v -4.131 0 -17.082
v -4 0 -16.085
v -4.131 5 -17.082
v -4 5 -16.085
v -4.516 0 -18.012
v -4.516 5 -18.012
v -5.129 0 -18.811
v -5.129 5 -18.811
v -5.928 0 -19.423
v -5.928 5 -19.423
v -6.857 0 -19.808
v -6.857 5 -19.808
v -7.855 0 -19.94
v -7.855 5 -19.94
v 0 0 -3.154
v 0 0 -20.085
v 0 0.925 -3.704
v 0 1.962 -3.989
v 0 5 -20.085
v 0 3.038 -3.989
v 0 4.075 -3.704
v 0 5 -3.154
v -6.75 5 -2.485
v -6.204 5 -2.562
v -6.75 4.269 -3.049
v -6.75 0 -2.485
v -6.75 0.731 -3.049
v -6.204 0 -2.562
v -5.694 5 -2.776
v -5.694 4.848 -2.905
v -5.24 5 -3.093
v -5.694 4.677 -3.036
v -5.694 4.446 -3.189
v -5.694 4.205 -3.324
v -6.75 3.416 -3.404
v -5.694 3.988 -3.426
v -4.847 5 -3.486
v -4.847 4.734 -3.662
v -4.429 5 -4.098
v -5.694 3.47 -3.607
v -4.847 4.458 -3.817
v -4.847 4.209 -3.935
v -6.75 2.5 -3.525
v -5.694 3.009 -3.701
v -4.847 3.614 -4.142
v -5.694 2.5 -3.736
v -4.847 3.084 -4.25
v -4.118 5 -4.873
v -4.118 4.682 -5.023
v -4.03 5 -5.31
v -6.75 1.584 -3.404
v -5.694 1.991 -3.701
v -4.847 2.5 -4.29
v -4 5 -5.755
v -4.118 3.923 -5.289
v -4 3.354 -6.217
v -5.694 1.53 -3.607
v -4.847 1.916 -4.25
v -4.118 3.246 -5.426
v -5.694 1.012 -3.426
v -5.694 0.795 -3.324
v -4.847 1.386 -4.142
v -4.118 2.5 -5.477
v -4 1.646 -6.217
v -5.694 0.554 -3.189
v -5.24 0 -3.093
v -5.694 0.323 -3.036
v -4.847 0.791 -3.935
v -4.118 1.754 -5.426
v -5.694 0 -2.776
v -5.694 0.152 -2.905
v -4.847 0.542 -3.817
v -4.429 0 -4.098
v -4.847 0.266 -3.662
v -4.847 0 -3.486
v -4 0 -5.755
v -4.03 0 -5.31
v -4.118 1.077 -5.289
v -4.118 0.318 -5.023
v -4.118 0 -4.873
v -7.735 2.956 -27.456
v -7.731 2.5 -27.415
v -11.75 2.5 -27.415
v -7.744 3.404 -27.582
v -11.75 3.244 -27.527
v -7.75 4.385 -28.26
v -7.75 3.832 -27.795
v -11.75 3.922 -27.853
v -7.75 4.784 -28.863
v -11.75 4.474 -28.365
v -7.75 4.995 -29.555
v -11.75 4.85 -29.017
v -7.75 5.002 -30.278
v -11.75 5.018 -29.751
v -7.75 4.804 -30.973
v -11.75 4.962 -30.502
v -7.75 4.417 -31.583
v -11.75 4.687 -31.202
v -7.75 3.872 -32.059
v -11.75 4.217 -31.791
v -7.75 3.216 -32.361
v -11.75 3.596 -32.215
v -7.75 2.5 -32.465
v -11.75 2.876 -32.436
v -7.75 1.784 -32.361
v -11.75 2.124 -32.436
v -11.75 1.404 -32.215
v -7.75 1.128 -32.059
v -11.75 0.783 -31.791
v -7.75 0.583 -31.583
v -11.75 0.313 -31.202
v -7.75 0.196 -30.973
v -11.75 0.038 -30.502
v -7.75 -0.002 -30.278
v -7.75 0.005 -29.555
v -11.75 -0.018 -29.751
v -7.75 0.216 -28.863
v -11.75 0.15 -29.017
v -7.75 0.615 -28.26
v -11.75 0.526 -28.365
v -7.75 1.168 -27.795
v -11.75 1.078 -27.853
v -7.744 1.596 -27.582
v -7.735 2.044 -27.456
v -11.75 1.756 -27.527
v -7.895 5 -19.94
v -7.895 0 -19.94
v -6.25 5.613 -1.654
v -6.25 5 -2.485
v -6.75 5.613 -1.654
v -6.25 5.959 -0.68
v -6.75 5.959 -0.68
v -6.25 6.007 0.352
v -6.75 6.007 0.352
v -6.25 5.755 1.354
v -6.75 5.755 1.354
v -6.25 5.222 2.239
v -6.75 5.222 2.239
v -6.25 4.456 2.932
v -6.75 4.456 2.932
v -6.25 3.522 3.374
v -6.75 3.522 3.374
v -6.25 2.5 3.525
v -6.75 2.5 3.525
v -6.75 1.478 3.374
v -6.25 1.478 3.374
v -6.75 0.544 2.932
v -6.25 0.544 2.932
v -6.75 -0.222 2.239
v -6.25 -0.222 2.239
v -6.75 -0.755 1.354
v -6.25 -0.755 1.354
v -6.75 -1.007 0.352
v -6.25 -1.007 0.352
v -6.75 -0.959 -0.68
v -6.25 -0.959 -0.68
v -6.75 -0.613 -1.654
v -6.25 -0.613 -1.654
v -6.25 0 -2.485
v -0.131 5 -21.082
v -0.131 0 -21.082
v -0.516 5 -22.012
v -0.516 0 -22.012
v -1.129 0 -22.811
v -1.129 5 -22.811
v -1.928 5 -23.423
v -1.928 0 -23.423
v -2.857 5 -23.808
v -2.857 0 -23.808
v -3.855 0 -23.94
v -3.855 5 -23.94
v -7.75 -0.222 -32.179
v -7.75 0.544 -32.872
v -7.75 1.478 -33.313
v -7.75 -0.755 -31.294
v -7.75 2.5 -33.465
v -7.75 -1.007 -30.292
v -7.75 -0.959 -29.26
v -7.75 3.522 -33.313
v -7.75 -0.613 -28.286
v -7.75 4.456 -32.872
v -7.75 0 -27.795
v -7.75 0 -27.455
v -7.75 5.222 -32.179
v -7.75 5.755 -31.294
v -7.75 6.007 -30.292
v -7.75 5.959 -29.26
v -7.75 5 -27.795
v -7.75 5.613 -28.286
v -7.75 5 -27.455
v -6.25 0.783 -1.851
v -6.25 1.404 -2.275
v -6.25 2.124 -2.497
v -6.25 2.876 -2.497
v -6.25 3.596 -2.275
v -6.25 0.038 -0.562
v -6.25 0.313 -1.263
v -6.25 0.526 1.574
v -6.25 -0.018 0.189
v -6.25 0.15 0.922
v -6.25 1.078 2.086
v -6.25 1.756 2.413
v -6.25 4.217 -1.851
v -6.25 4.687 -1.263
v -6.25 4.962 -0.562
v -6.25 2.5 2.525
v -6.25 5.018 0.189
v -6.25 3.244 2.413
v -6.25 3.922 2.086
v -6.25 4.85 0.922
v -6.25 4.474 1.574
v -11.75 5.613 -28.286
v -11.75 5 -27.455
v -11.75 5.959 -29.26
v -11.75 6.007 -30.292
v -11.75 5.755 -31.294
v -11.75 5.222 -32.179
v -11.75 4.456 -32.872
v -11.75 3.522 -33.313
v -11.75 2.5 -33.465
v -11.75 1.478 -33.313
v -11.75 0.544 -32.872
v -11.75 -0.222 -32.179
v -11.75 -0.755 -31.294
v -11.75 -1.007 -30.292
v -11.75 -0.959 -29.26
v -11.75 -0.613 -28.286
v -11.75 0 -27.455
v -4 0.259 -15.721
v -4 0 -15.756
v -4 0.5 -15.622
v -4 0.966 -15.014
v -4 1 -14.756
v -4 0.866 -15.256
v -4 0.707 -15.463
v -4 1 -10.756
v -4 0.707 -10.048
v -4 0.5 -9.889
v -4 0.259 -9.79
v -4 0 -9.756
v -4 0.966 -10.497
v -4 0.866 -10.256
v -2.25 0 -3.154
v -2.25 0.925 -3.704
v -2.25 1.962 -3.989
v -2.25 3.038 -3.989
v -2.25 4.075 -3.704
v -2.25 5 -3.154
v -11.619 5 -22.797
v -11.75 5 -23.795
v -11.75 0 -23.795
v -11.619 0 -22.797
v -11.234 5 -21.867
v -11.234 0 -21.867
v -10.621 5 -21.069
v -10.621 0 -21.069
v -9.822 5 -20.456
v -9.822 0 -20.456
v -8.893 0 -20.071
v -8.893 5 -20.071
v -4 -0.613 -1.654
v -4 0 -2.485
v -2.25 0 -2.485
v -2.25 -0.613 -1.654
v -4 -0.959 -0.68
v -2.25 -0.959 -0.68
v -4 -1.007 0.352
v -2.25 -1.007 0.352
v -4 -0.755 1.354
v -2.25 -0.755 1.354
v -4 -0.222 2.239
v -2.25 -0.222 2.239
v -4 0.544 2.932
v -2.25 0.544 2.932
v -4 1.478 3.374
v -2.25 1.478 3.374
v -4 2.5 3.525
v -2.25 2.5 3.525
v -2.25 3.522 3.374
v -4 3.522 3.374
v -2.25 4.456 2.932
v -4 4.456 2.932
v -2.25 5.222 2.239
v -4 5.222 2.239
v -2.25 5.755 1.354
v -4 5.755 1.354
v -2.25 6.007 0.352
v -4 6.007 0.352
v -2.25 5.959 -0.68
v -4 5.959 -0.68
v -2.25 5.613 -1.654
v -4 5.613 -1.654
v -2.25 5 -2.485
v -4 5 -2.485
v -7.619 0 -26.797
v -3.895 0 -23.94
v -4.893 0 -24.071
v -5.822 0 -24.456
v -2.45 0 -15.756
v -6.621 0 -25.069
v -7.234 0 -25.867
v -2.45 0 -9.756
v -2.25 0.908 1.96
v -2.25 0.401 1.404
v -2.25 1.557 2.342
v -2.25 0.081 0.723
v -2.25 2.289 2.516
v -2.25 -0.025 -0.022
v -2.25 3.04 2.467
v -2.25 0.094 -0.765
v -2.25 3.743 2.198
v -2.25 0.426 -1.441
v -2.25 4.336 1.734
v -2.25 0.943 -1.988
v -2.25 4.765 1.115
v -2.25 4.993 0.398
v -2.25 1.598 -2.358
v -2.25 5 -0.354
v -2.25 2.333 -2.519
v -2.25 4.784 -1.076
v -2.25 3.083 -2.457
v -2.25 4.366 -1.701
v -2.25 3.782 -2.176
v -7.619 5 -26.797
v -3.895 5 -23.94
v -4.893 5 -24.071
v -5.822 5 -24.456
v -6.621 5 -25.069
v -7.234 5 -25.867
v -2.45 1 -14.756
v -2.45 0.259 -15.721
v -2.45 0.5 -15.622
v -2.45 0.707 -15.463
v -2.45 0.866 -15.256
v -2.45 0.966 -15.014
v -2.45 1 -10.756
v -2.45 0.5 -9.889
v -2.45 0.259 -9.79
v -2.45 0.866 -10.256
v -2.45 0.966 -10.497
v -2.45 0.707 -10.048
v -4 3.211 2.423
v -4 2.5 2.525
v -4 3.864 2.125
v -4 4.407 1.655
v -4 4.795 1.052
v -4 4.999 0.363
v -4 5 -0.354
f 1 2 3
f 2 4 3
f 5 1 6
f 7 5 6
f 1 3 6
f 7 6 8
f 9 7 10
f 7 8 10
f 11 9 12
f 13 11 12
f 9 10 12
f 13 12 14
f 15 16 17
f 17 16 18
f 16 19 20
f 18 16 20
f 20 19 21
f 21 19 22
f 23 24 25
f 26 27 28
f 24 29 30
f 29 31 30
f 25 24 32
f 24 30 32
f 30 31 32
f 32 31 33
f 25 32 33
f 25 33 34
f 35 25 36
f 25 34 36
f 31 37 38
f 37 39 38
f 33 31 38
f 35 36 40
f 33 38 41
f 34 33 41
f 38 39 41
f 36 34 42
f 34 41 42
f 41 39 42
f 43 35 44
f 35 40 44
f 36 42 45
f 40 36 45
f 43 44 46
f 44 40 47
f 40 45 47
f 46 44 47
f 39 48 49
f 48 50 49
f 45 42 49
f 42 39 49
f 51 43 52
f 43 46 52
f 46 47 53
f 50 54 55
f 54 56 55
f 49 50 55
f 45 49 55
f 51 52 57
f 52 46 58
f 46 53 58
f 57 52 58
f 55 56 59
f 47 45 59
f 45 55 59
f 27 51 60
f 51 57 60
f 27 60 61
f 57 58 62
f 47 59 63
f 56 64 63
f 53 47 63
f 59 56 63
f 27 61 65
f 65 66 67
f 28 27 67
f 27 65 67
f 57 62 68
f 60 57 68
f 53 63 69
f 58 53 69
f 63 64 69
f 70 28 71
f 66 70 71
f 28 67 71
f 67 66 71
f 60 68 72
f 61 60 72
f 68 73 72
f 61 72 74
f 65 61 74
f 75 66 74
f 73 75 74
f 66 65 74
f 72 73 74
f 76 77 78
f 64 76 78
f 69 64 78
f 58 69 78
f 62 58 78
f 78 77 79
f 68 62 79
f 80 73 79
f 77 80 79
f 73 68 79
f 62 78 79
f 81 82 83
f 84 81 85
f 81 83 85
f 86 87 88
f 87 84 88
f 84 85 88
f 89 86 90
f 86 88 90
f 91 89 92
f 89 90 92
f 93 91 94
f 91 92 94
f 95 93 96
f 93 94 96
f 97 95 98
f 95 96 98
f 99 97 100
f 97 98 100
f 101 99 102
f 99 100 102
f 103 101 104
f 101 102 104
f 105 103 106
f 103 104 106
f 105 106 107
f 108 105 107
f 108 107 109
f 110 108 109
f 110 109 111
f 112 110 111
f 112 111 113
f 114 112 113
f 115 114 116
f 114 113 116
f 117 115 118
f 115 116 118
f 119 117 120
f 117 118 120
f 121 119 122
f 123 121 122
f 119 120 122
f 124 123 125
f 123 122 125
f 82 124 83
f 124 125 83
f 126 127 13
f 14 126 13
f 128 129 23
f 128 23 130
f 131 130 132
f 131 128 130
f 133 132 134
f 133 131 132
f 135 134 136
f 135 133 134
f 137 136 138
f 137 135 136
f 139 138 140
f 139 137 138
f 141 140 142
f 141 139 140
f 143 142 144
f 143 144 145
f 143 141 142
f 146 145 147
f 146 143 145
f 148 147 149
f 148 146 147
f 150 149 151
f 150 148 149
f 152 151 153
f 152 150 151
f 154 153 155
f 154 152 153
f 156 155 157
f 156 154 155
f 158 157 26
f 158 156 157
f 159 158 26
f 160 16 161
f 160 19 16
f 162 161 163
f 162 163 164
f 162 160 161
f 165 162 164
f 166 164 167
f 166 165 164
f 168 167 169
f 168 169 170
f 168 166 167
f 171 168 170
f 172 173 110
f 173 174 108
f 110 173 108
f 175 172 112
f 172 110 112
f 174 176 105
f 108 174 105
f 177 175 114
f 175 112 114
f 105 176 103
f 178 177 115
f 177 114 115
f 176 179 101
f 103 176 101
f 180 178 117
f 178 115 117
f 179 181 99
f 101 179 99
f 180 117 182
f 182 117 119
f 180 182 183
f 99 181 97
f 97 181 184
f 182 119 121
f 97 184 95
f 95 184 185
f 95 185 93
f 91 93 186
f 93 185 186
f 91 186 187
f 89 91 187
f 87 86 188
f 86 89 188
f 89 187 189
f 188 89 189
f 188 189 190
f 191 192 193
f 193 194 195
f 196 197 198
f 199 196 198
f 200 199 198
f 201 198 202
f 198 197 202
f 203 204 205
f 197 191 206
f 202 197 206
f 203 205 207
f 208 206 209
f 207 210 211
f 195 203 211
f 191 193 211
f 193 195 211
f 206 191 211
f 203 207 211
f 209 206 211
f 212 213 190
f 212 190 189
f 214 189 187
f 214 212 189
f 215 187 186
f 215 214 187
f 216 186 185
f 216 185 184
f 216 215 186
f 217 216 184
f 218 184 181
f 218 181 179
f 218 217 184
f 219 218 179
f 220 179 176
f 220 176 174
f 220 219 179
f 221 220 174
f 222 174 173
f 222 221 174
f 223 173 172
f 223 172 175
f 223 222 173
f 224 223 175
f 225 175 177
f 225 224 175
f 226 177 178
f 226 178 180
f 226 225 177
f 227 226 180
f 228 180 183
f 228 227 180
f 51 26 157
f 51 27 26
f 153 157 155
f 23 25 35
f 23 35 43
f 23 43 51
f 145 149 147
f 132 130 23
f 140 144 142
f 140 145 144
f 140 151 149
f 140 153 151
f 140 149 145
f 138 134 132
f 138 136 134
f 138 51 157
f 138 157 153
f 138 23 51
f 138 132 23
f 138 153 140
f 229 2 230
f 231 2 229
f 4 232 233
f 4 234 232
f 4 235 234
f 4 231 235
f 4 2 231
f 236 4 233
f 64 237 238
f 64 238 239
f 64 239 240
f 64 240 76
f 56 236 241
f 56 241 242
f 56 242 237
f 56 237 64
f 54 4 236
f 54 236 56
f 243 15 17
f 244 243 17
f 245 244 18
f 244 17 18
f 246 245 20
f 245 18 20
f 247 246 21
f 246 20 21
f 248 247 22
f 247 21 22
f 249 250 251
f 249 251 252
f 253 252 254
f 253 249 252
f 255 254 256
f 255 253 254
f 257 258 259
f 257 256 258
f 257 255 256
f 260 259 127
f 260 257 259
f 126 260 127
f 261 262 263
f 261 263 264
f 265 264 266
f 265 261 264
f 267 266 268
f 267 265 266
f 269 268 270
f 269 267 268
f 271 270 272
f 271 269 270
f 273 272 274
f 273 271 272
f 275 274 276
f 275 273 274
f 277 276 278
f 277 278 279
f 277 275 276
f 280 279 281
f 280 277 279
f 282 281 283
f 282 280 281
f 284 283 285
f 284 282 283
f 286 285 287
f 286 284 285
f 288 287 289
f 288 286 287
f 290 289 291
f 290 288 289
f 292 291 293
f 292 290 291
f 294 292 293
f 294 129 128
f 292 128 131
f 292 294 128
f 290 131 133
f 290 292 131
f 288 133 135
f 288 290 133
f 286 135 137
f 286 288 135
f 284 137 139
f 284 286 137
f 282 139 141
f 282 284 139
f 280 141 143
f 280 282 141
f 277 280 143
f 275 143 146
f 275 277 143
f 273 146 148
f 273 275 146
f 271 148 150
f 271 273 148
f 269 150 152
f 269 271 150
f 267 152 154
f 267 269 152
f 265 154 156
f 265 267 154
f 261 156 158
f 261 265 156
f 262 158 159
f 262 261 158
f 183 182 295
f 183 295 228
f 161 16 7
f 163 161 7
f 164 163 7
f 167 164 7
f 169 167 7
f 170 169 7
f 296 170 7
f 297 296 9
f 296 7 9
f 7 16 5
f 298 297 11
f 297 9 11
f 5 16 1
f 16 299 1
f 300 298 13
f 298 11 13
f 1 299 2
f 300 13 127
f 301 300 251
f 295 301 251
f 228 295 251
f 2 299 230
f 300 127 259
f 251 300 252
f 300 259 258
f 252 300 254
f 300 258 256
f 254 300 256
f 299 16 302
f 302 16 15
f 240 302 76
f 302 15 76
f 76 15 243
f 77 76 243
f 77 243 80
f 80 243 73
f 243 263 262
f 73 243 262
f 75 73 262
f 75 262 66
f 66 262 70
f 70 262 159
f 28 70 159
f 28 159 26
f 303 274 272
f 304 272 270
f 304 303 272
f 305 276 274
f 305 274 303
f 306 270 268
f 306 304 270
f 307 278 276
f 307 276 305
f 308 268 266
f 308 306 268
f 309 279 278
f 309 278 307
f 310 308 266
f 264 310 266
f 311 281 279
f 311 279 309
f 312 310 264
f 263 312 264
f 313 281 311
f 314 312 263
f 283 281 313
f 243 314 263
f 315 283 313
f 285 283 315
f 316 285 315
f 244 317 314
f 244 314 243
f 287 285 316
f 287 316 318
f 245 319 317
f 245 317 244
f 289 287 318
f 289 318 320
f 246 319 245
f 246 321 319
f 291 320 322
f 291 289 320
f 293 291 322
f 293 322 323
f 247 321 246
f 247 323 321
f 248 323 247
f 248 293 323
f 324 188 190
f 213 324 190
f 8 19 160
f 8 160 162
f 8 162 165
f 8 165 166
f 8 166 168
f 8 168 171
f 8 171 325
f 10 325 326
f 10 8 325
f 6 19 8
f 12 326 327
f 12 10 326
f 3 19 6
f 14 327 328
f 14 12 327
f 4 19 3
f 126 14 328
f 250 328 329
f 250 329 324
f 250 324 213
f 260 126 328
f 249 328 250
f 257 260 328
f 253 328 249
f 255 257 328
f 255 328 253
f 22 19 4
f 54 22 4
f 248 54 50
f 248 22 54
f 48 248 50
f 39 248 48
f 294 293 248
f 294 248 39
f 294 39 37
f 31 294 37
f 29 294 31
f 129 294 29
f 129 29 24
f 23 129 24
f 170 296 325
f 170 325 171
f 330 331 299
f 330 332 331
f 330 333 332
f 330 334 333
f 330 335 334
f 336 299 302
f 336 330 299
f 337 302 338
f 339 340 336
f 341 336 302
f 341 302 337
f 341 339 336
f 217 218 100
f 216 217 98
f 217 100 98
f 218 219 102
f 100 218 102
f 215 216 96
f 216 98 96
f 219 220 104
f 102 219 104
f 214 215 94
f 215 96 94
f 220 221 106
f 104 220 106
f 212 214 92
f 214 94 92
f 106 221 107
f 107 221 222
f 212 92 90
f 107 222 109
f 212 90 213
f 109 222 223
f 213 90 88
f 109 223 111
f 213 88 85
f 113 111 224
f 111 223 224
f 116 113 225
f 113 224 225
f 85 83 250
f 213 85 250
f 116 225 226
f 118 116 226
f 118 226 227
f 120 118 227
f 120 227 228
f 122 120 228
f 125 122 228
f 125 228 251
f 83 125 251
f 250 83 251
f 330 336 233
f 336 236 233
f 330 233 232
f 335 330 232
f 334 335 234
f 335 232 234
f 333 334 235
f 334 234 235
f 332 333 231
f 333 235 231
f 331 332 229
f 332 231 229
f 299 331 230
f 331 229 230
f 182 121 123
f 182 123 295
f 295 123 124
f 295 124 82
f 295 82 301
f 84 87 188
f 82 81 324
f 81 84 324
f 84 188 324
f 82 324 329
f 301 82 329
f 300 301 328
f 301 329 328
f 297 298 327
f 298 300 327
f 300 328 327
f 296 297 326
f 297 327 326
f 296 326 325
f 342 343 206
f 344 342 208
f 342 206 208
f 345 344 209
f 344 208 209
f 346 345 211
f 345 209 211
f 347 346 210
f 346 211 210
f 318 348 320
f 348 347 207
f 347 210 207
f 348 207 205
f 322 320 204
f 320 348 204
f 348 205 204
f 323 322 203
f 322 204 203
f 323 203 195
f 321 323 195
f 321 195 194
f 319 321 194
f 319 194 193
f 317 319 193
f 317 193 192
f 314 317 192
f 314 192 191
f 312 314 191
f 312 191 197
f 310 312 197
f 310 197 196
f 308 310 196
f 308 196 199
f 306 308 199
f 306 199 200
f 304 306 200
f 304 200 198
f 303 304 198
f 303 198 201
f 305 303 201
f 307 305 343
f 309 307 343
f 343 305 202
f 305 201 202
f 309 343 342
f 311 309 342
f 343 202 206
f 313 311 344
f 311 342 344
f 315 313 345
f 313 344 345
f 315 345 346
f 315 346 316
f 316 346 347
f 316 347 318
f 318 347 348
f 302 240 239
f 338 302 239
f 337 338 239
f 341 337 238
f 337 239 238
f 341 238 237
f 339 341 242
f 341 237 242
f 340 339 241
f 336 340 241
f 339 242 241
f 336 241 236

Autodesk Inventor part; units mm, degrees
ref_plane "YZ Plane" through (0, 0, 0) normal (1, 0, 0) x (0, 1, 0)
ref_plane "XZ Plane" through (0, 0, 0) normal (0, 1, 0) x (-1, 0, 0)
ref_plane "XY Plane" through (0, 0, 0) normal (0, 0, 1) x (1, 0, 0)
sketch "Эскиз1" plane through (0, 0, 0) normal (0, 1, 0) x (-1, 0, 0)
  line L0 (0, 0) -> (4, 0)
  line L1 (4, 0) -> (4, -23.9397)
  line L2 (4, -23.9397) -> (0, -23.9397)
  line L3 (0, -23.9397) -> (0, 0)
  line L4 (0, -23.9397) -> (11.75, -23.9397)
  line L5 (11.75, -23.9397) -> (11.75, -19.9397)
  line L6 (11.75, -19.9397) -> (0, -19.9397)
  line L7 (0, -19.9397) -> (0, -23.9397)
  line L8 (11.75, -19.9397) -> (7.75, -19.9397)
  line L9 (7.75, -19.9397) -> (7.75, -29.9397)
  line L10 (7.75, -29.9397) -> (11.75, -29.9397)
  line L11 (11.75, -29.9397) -> (11.75, -19.9397)
  line L12 (11.75, -23.9397) -> (4, -19.9397)
  line L13 (0, -19.9397) -> (7.75, -23.9397)
  point P0 (3, -20.536)
  point P1 (0, -19.9397)
  dimension "d10" = 4
  dimension "d11" = 11.75
  dimension "d36" = 29.9397
  dimension "d57" = 10
extrude "Выдавливание1" add sketch "Эскиз1" along normal blind 5
fillet "Сопряжение2" radius 3.855 4 edges at (-4, 2.5, -19.9397) (-11.75, 2.5, -19.9397) (0, 2.5, -23.9397) (-7.75, 2.5, -23.9397)
sketch "Эскиз7" plane through (-11.75, 0, -29.9397) normal (-1, 0, 0) x (0, 0, 1)
  line L0 (0, 0) -> (0, 5) projected
  circle A0 centre (0, 2.5) radius 2.525
  circle A1 centre (0, 2.5) radius 3.525
  point P0 (29.9397, 0)
  point P1 (0, 4.975)
  point P2 (0, 0.025)
  dimension "d37" = 5.05
  dimension "d38" = 7.05
extrude "Выдавливание5" add sketch "Эскиз7" against normal up to surface (4 mm away) contours A0 | A1
extrude "Выдавливание8" cut sketch "Эскиз7" against normal through all contours A0
sketch "Эскиз8" plane through (-4, 0, 0) normal (-1, 0, 0) x (0, 0, 1)
  line L0 (0, 0) -> (0, 5) projected
  circle A0 centre (0, 2.5) radius 2.525
  circle A1 centre (0, 2.5) radius 3.525
  point P0 (0, 4.975)
  point P1 (0, 0.025)
  dimension "d41" = 5.05
  dimension "d42" = 7.05
extrude "Выдавливание6" add sketch "Эскиз8" against normal up to surface (4 mm away)
extrude "Выдавливание7" cut sketch "Эскиз8" against normal through all contours A0
sketch "Эскиз9" plane through (0, 0, -20.0847) normal (1, 0, 0) x (0, 0, -1)
  arc A0 (-19.7302, 5) -> (-19.7302, 0) centre (-20.0847, 2.5) ccw projected
  circle A1 centre (-20.0847, 2.5) radius 4.025
  arc A2 (-17.5996, 5) -> (-17.5996, 0) centre (-20.0847, 2.5) ccw projected
  point P0 (-20.0847, 0)
  point P1 (-20.0847, 4.975)
  point P2 (-20.0847, 0.025)
  dimension "d49" = 0.5
extrude "Выдавливание9" cut sketch "Эскиз9" against normal blind 2.25
sketch "Эскиз10" plane through (-4, 0, -16.0847) normal (-1, 0, 0) x (0, 0, 1)
  arc A0 (13.5996, 0) -> (13.5996, 5) centre (16.0847, 2.5) ccw projected
  circle A1 centre (16.0847, 2.5) radius 3.525
  circle A2 centre (16.0847, 2.5) radius 2.525 projected
  point P0 (16.0847, 0)
  point P1 (13.5996, 5)
  point P2 (13.5996, 0)
extrude "Выдавливание10" add sketch "Эскиз10" along normal blind 2.25
sketch "Эскиз11" plane through (-6.25, 2.5, 0) normal (-1, 0, 0) x (0, 0, 1)
  circle A0 centre (0, 0) radius 3.525 projected
  point P0 (0, -2.5)
extrude "Выдавливание11" add sketch "Эскиз11" along normal blind 0.5
fillet "Сопряжение6" radius 2.75 1 edges at (-4, 2.5, -3.525)
sketch "Эскиз12" plane through (-4, 0, -16.0847) normal (-1, 0, 0) x (0, 0, 1)
  line L0 (5.3292, 0) -> (1.3292, 0) construction
  line L1 (5.3292, 1) -> (1.3292, 1)
  line L2 (1.3292, -1) -> (5.3292, -1)
  arc A0 (5.3292, -1) -> (5.3292, 1) centre (5.3292, 0) ccw
  arc A1 (1.3292, 1) -> (1.3292, -1) centre (1.3292, 0) ccw
  line L3 (0, 0) -> (10.3292, 0) projected
  point P0 (16.0847, 0)
  point P1 (3.3292, 0)
  dimension "d58" = 2
  dimension "d59" = 2
  dimension "d63" = 7
extrude "Выдавливание12" cut sketch "Эскиз12" against normal blind 1.55
properties part number "Рулевая тяга"
